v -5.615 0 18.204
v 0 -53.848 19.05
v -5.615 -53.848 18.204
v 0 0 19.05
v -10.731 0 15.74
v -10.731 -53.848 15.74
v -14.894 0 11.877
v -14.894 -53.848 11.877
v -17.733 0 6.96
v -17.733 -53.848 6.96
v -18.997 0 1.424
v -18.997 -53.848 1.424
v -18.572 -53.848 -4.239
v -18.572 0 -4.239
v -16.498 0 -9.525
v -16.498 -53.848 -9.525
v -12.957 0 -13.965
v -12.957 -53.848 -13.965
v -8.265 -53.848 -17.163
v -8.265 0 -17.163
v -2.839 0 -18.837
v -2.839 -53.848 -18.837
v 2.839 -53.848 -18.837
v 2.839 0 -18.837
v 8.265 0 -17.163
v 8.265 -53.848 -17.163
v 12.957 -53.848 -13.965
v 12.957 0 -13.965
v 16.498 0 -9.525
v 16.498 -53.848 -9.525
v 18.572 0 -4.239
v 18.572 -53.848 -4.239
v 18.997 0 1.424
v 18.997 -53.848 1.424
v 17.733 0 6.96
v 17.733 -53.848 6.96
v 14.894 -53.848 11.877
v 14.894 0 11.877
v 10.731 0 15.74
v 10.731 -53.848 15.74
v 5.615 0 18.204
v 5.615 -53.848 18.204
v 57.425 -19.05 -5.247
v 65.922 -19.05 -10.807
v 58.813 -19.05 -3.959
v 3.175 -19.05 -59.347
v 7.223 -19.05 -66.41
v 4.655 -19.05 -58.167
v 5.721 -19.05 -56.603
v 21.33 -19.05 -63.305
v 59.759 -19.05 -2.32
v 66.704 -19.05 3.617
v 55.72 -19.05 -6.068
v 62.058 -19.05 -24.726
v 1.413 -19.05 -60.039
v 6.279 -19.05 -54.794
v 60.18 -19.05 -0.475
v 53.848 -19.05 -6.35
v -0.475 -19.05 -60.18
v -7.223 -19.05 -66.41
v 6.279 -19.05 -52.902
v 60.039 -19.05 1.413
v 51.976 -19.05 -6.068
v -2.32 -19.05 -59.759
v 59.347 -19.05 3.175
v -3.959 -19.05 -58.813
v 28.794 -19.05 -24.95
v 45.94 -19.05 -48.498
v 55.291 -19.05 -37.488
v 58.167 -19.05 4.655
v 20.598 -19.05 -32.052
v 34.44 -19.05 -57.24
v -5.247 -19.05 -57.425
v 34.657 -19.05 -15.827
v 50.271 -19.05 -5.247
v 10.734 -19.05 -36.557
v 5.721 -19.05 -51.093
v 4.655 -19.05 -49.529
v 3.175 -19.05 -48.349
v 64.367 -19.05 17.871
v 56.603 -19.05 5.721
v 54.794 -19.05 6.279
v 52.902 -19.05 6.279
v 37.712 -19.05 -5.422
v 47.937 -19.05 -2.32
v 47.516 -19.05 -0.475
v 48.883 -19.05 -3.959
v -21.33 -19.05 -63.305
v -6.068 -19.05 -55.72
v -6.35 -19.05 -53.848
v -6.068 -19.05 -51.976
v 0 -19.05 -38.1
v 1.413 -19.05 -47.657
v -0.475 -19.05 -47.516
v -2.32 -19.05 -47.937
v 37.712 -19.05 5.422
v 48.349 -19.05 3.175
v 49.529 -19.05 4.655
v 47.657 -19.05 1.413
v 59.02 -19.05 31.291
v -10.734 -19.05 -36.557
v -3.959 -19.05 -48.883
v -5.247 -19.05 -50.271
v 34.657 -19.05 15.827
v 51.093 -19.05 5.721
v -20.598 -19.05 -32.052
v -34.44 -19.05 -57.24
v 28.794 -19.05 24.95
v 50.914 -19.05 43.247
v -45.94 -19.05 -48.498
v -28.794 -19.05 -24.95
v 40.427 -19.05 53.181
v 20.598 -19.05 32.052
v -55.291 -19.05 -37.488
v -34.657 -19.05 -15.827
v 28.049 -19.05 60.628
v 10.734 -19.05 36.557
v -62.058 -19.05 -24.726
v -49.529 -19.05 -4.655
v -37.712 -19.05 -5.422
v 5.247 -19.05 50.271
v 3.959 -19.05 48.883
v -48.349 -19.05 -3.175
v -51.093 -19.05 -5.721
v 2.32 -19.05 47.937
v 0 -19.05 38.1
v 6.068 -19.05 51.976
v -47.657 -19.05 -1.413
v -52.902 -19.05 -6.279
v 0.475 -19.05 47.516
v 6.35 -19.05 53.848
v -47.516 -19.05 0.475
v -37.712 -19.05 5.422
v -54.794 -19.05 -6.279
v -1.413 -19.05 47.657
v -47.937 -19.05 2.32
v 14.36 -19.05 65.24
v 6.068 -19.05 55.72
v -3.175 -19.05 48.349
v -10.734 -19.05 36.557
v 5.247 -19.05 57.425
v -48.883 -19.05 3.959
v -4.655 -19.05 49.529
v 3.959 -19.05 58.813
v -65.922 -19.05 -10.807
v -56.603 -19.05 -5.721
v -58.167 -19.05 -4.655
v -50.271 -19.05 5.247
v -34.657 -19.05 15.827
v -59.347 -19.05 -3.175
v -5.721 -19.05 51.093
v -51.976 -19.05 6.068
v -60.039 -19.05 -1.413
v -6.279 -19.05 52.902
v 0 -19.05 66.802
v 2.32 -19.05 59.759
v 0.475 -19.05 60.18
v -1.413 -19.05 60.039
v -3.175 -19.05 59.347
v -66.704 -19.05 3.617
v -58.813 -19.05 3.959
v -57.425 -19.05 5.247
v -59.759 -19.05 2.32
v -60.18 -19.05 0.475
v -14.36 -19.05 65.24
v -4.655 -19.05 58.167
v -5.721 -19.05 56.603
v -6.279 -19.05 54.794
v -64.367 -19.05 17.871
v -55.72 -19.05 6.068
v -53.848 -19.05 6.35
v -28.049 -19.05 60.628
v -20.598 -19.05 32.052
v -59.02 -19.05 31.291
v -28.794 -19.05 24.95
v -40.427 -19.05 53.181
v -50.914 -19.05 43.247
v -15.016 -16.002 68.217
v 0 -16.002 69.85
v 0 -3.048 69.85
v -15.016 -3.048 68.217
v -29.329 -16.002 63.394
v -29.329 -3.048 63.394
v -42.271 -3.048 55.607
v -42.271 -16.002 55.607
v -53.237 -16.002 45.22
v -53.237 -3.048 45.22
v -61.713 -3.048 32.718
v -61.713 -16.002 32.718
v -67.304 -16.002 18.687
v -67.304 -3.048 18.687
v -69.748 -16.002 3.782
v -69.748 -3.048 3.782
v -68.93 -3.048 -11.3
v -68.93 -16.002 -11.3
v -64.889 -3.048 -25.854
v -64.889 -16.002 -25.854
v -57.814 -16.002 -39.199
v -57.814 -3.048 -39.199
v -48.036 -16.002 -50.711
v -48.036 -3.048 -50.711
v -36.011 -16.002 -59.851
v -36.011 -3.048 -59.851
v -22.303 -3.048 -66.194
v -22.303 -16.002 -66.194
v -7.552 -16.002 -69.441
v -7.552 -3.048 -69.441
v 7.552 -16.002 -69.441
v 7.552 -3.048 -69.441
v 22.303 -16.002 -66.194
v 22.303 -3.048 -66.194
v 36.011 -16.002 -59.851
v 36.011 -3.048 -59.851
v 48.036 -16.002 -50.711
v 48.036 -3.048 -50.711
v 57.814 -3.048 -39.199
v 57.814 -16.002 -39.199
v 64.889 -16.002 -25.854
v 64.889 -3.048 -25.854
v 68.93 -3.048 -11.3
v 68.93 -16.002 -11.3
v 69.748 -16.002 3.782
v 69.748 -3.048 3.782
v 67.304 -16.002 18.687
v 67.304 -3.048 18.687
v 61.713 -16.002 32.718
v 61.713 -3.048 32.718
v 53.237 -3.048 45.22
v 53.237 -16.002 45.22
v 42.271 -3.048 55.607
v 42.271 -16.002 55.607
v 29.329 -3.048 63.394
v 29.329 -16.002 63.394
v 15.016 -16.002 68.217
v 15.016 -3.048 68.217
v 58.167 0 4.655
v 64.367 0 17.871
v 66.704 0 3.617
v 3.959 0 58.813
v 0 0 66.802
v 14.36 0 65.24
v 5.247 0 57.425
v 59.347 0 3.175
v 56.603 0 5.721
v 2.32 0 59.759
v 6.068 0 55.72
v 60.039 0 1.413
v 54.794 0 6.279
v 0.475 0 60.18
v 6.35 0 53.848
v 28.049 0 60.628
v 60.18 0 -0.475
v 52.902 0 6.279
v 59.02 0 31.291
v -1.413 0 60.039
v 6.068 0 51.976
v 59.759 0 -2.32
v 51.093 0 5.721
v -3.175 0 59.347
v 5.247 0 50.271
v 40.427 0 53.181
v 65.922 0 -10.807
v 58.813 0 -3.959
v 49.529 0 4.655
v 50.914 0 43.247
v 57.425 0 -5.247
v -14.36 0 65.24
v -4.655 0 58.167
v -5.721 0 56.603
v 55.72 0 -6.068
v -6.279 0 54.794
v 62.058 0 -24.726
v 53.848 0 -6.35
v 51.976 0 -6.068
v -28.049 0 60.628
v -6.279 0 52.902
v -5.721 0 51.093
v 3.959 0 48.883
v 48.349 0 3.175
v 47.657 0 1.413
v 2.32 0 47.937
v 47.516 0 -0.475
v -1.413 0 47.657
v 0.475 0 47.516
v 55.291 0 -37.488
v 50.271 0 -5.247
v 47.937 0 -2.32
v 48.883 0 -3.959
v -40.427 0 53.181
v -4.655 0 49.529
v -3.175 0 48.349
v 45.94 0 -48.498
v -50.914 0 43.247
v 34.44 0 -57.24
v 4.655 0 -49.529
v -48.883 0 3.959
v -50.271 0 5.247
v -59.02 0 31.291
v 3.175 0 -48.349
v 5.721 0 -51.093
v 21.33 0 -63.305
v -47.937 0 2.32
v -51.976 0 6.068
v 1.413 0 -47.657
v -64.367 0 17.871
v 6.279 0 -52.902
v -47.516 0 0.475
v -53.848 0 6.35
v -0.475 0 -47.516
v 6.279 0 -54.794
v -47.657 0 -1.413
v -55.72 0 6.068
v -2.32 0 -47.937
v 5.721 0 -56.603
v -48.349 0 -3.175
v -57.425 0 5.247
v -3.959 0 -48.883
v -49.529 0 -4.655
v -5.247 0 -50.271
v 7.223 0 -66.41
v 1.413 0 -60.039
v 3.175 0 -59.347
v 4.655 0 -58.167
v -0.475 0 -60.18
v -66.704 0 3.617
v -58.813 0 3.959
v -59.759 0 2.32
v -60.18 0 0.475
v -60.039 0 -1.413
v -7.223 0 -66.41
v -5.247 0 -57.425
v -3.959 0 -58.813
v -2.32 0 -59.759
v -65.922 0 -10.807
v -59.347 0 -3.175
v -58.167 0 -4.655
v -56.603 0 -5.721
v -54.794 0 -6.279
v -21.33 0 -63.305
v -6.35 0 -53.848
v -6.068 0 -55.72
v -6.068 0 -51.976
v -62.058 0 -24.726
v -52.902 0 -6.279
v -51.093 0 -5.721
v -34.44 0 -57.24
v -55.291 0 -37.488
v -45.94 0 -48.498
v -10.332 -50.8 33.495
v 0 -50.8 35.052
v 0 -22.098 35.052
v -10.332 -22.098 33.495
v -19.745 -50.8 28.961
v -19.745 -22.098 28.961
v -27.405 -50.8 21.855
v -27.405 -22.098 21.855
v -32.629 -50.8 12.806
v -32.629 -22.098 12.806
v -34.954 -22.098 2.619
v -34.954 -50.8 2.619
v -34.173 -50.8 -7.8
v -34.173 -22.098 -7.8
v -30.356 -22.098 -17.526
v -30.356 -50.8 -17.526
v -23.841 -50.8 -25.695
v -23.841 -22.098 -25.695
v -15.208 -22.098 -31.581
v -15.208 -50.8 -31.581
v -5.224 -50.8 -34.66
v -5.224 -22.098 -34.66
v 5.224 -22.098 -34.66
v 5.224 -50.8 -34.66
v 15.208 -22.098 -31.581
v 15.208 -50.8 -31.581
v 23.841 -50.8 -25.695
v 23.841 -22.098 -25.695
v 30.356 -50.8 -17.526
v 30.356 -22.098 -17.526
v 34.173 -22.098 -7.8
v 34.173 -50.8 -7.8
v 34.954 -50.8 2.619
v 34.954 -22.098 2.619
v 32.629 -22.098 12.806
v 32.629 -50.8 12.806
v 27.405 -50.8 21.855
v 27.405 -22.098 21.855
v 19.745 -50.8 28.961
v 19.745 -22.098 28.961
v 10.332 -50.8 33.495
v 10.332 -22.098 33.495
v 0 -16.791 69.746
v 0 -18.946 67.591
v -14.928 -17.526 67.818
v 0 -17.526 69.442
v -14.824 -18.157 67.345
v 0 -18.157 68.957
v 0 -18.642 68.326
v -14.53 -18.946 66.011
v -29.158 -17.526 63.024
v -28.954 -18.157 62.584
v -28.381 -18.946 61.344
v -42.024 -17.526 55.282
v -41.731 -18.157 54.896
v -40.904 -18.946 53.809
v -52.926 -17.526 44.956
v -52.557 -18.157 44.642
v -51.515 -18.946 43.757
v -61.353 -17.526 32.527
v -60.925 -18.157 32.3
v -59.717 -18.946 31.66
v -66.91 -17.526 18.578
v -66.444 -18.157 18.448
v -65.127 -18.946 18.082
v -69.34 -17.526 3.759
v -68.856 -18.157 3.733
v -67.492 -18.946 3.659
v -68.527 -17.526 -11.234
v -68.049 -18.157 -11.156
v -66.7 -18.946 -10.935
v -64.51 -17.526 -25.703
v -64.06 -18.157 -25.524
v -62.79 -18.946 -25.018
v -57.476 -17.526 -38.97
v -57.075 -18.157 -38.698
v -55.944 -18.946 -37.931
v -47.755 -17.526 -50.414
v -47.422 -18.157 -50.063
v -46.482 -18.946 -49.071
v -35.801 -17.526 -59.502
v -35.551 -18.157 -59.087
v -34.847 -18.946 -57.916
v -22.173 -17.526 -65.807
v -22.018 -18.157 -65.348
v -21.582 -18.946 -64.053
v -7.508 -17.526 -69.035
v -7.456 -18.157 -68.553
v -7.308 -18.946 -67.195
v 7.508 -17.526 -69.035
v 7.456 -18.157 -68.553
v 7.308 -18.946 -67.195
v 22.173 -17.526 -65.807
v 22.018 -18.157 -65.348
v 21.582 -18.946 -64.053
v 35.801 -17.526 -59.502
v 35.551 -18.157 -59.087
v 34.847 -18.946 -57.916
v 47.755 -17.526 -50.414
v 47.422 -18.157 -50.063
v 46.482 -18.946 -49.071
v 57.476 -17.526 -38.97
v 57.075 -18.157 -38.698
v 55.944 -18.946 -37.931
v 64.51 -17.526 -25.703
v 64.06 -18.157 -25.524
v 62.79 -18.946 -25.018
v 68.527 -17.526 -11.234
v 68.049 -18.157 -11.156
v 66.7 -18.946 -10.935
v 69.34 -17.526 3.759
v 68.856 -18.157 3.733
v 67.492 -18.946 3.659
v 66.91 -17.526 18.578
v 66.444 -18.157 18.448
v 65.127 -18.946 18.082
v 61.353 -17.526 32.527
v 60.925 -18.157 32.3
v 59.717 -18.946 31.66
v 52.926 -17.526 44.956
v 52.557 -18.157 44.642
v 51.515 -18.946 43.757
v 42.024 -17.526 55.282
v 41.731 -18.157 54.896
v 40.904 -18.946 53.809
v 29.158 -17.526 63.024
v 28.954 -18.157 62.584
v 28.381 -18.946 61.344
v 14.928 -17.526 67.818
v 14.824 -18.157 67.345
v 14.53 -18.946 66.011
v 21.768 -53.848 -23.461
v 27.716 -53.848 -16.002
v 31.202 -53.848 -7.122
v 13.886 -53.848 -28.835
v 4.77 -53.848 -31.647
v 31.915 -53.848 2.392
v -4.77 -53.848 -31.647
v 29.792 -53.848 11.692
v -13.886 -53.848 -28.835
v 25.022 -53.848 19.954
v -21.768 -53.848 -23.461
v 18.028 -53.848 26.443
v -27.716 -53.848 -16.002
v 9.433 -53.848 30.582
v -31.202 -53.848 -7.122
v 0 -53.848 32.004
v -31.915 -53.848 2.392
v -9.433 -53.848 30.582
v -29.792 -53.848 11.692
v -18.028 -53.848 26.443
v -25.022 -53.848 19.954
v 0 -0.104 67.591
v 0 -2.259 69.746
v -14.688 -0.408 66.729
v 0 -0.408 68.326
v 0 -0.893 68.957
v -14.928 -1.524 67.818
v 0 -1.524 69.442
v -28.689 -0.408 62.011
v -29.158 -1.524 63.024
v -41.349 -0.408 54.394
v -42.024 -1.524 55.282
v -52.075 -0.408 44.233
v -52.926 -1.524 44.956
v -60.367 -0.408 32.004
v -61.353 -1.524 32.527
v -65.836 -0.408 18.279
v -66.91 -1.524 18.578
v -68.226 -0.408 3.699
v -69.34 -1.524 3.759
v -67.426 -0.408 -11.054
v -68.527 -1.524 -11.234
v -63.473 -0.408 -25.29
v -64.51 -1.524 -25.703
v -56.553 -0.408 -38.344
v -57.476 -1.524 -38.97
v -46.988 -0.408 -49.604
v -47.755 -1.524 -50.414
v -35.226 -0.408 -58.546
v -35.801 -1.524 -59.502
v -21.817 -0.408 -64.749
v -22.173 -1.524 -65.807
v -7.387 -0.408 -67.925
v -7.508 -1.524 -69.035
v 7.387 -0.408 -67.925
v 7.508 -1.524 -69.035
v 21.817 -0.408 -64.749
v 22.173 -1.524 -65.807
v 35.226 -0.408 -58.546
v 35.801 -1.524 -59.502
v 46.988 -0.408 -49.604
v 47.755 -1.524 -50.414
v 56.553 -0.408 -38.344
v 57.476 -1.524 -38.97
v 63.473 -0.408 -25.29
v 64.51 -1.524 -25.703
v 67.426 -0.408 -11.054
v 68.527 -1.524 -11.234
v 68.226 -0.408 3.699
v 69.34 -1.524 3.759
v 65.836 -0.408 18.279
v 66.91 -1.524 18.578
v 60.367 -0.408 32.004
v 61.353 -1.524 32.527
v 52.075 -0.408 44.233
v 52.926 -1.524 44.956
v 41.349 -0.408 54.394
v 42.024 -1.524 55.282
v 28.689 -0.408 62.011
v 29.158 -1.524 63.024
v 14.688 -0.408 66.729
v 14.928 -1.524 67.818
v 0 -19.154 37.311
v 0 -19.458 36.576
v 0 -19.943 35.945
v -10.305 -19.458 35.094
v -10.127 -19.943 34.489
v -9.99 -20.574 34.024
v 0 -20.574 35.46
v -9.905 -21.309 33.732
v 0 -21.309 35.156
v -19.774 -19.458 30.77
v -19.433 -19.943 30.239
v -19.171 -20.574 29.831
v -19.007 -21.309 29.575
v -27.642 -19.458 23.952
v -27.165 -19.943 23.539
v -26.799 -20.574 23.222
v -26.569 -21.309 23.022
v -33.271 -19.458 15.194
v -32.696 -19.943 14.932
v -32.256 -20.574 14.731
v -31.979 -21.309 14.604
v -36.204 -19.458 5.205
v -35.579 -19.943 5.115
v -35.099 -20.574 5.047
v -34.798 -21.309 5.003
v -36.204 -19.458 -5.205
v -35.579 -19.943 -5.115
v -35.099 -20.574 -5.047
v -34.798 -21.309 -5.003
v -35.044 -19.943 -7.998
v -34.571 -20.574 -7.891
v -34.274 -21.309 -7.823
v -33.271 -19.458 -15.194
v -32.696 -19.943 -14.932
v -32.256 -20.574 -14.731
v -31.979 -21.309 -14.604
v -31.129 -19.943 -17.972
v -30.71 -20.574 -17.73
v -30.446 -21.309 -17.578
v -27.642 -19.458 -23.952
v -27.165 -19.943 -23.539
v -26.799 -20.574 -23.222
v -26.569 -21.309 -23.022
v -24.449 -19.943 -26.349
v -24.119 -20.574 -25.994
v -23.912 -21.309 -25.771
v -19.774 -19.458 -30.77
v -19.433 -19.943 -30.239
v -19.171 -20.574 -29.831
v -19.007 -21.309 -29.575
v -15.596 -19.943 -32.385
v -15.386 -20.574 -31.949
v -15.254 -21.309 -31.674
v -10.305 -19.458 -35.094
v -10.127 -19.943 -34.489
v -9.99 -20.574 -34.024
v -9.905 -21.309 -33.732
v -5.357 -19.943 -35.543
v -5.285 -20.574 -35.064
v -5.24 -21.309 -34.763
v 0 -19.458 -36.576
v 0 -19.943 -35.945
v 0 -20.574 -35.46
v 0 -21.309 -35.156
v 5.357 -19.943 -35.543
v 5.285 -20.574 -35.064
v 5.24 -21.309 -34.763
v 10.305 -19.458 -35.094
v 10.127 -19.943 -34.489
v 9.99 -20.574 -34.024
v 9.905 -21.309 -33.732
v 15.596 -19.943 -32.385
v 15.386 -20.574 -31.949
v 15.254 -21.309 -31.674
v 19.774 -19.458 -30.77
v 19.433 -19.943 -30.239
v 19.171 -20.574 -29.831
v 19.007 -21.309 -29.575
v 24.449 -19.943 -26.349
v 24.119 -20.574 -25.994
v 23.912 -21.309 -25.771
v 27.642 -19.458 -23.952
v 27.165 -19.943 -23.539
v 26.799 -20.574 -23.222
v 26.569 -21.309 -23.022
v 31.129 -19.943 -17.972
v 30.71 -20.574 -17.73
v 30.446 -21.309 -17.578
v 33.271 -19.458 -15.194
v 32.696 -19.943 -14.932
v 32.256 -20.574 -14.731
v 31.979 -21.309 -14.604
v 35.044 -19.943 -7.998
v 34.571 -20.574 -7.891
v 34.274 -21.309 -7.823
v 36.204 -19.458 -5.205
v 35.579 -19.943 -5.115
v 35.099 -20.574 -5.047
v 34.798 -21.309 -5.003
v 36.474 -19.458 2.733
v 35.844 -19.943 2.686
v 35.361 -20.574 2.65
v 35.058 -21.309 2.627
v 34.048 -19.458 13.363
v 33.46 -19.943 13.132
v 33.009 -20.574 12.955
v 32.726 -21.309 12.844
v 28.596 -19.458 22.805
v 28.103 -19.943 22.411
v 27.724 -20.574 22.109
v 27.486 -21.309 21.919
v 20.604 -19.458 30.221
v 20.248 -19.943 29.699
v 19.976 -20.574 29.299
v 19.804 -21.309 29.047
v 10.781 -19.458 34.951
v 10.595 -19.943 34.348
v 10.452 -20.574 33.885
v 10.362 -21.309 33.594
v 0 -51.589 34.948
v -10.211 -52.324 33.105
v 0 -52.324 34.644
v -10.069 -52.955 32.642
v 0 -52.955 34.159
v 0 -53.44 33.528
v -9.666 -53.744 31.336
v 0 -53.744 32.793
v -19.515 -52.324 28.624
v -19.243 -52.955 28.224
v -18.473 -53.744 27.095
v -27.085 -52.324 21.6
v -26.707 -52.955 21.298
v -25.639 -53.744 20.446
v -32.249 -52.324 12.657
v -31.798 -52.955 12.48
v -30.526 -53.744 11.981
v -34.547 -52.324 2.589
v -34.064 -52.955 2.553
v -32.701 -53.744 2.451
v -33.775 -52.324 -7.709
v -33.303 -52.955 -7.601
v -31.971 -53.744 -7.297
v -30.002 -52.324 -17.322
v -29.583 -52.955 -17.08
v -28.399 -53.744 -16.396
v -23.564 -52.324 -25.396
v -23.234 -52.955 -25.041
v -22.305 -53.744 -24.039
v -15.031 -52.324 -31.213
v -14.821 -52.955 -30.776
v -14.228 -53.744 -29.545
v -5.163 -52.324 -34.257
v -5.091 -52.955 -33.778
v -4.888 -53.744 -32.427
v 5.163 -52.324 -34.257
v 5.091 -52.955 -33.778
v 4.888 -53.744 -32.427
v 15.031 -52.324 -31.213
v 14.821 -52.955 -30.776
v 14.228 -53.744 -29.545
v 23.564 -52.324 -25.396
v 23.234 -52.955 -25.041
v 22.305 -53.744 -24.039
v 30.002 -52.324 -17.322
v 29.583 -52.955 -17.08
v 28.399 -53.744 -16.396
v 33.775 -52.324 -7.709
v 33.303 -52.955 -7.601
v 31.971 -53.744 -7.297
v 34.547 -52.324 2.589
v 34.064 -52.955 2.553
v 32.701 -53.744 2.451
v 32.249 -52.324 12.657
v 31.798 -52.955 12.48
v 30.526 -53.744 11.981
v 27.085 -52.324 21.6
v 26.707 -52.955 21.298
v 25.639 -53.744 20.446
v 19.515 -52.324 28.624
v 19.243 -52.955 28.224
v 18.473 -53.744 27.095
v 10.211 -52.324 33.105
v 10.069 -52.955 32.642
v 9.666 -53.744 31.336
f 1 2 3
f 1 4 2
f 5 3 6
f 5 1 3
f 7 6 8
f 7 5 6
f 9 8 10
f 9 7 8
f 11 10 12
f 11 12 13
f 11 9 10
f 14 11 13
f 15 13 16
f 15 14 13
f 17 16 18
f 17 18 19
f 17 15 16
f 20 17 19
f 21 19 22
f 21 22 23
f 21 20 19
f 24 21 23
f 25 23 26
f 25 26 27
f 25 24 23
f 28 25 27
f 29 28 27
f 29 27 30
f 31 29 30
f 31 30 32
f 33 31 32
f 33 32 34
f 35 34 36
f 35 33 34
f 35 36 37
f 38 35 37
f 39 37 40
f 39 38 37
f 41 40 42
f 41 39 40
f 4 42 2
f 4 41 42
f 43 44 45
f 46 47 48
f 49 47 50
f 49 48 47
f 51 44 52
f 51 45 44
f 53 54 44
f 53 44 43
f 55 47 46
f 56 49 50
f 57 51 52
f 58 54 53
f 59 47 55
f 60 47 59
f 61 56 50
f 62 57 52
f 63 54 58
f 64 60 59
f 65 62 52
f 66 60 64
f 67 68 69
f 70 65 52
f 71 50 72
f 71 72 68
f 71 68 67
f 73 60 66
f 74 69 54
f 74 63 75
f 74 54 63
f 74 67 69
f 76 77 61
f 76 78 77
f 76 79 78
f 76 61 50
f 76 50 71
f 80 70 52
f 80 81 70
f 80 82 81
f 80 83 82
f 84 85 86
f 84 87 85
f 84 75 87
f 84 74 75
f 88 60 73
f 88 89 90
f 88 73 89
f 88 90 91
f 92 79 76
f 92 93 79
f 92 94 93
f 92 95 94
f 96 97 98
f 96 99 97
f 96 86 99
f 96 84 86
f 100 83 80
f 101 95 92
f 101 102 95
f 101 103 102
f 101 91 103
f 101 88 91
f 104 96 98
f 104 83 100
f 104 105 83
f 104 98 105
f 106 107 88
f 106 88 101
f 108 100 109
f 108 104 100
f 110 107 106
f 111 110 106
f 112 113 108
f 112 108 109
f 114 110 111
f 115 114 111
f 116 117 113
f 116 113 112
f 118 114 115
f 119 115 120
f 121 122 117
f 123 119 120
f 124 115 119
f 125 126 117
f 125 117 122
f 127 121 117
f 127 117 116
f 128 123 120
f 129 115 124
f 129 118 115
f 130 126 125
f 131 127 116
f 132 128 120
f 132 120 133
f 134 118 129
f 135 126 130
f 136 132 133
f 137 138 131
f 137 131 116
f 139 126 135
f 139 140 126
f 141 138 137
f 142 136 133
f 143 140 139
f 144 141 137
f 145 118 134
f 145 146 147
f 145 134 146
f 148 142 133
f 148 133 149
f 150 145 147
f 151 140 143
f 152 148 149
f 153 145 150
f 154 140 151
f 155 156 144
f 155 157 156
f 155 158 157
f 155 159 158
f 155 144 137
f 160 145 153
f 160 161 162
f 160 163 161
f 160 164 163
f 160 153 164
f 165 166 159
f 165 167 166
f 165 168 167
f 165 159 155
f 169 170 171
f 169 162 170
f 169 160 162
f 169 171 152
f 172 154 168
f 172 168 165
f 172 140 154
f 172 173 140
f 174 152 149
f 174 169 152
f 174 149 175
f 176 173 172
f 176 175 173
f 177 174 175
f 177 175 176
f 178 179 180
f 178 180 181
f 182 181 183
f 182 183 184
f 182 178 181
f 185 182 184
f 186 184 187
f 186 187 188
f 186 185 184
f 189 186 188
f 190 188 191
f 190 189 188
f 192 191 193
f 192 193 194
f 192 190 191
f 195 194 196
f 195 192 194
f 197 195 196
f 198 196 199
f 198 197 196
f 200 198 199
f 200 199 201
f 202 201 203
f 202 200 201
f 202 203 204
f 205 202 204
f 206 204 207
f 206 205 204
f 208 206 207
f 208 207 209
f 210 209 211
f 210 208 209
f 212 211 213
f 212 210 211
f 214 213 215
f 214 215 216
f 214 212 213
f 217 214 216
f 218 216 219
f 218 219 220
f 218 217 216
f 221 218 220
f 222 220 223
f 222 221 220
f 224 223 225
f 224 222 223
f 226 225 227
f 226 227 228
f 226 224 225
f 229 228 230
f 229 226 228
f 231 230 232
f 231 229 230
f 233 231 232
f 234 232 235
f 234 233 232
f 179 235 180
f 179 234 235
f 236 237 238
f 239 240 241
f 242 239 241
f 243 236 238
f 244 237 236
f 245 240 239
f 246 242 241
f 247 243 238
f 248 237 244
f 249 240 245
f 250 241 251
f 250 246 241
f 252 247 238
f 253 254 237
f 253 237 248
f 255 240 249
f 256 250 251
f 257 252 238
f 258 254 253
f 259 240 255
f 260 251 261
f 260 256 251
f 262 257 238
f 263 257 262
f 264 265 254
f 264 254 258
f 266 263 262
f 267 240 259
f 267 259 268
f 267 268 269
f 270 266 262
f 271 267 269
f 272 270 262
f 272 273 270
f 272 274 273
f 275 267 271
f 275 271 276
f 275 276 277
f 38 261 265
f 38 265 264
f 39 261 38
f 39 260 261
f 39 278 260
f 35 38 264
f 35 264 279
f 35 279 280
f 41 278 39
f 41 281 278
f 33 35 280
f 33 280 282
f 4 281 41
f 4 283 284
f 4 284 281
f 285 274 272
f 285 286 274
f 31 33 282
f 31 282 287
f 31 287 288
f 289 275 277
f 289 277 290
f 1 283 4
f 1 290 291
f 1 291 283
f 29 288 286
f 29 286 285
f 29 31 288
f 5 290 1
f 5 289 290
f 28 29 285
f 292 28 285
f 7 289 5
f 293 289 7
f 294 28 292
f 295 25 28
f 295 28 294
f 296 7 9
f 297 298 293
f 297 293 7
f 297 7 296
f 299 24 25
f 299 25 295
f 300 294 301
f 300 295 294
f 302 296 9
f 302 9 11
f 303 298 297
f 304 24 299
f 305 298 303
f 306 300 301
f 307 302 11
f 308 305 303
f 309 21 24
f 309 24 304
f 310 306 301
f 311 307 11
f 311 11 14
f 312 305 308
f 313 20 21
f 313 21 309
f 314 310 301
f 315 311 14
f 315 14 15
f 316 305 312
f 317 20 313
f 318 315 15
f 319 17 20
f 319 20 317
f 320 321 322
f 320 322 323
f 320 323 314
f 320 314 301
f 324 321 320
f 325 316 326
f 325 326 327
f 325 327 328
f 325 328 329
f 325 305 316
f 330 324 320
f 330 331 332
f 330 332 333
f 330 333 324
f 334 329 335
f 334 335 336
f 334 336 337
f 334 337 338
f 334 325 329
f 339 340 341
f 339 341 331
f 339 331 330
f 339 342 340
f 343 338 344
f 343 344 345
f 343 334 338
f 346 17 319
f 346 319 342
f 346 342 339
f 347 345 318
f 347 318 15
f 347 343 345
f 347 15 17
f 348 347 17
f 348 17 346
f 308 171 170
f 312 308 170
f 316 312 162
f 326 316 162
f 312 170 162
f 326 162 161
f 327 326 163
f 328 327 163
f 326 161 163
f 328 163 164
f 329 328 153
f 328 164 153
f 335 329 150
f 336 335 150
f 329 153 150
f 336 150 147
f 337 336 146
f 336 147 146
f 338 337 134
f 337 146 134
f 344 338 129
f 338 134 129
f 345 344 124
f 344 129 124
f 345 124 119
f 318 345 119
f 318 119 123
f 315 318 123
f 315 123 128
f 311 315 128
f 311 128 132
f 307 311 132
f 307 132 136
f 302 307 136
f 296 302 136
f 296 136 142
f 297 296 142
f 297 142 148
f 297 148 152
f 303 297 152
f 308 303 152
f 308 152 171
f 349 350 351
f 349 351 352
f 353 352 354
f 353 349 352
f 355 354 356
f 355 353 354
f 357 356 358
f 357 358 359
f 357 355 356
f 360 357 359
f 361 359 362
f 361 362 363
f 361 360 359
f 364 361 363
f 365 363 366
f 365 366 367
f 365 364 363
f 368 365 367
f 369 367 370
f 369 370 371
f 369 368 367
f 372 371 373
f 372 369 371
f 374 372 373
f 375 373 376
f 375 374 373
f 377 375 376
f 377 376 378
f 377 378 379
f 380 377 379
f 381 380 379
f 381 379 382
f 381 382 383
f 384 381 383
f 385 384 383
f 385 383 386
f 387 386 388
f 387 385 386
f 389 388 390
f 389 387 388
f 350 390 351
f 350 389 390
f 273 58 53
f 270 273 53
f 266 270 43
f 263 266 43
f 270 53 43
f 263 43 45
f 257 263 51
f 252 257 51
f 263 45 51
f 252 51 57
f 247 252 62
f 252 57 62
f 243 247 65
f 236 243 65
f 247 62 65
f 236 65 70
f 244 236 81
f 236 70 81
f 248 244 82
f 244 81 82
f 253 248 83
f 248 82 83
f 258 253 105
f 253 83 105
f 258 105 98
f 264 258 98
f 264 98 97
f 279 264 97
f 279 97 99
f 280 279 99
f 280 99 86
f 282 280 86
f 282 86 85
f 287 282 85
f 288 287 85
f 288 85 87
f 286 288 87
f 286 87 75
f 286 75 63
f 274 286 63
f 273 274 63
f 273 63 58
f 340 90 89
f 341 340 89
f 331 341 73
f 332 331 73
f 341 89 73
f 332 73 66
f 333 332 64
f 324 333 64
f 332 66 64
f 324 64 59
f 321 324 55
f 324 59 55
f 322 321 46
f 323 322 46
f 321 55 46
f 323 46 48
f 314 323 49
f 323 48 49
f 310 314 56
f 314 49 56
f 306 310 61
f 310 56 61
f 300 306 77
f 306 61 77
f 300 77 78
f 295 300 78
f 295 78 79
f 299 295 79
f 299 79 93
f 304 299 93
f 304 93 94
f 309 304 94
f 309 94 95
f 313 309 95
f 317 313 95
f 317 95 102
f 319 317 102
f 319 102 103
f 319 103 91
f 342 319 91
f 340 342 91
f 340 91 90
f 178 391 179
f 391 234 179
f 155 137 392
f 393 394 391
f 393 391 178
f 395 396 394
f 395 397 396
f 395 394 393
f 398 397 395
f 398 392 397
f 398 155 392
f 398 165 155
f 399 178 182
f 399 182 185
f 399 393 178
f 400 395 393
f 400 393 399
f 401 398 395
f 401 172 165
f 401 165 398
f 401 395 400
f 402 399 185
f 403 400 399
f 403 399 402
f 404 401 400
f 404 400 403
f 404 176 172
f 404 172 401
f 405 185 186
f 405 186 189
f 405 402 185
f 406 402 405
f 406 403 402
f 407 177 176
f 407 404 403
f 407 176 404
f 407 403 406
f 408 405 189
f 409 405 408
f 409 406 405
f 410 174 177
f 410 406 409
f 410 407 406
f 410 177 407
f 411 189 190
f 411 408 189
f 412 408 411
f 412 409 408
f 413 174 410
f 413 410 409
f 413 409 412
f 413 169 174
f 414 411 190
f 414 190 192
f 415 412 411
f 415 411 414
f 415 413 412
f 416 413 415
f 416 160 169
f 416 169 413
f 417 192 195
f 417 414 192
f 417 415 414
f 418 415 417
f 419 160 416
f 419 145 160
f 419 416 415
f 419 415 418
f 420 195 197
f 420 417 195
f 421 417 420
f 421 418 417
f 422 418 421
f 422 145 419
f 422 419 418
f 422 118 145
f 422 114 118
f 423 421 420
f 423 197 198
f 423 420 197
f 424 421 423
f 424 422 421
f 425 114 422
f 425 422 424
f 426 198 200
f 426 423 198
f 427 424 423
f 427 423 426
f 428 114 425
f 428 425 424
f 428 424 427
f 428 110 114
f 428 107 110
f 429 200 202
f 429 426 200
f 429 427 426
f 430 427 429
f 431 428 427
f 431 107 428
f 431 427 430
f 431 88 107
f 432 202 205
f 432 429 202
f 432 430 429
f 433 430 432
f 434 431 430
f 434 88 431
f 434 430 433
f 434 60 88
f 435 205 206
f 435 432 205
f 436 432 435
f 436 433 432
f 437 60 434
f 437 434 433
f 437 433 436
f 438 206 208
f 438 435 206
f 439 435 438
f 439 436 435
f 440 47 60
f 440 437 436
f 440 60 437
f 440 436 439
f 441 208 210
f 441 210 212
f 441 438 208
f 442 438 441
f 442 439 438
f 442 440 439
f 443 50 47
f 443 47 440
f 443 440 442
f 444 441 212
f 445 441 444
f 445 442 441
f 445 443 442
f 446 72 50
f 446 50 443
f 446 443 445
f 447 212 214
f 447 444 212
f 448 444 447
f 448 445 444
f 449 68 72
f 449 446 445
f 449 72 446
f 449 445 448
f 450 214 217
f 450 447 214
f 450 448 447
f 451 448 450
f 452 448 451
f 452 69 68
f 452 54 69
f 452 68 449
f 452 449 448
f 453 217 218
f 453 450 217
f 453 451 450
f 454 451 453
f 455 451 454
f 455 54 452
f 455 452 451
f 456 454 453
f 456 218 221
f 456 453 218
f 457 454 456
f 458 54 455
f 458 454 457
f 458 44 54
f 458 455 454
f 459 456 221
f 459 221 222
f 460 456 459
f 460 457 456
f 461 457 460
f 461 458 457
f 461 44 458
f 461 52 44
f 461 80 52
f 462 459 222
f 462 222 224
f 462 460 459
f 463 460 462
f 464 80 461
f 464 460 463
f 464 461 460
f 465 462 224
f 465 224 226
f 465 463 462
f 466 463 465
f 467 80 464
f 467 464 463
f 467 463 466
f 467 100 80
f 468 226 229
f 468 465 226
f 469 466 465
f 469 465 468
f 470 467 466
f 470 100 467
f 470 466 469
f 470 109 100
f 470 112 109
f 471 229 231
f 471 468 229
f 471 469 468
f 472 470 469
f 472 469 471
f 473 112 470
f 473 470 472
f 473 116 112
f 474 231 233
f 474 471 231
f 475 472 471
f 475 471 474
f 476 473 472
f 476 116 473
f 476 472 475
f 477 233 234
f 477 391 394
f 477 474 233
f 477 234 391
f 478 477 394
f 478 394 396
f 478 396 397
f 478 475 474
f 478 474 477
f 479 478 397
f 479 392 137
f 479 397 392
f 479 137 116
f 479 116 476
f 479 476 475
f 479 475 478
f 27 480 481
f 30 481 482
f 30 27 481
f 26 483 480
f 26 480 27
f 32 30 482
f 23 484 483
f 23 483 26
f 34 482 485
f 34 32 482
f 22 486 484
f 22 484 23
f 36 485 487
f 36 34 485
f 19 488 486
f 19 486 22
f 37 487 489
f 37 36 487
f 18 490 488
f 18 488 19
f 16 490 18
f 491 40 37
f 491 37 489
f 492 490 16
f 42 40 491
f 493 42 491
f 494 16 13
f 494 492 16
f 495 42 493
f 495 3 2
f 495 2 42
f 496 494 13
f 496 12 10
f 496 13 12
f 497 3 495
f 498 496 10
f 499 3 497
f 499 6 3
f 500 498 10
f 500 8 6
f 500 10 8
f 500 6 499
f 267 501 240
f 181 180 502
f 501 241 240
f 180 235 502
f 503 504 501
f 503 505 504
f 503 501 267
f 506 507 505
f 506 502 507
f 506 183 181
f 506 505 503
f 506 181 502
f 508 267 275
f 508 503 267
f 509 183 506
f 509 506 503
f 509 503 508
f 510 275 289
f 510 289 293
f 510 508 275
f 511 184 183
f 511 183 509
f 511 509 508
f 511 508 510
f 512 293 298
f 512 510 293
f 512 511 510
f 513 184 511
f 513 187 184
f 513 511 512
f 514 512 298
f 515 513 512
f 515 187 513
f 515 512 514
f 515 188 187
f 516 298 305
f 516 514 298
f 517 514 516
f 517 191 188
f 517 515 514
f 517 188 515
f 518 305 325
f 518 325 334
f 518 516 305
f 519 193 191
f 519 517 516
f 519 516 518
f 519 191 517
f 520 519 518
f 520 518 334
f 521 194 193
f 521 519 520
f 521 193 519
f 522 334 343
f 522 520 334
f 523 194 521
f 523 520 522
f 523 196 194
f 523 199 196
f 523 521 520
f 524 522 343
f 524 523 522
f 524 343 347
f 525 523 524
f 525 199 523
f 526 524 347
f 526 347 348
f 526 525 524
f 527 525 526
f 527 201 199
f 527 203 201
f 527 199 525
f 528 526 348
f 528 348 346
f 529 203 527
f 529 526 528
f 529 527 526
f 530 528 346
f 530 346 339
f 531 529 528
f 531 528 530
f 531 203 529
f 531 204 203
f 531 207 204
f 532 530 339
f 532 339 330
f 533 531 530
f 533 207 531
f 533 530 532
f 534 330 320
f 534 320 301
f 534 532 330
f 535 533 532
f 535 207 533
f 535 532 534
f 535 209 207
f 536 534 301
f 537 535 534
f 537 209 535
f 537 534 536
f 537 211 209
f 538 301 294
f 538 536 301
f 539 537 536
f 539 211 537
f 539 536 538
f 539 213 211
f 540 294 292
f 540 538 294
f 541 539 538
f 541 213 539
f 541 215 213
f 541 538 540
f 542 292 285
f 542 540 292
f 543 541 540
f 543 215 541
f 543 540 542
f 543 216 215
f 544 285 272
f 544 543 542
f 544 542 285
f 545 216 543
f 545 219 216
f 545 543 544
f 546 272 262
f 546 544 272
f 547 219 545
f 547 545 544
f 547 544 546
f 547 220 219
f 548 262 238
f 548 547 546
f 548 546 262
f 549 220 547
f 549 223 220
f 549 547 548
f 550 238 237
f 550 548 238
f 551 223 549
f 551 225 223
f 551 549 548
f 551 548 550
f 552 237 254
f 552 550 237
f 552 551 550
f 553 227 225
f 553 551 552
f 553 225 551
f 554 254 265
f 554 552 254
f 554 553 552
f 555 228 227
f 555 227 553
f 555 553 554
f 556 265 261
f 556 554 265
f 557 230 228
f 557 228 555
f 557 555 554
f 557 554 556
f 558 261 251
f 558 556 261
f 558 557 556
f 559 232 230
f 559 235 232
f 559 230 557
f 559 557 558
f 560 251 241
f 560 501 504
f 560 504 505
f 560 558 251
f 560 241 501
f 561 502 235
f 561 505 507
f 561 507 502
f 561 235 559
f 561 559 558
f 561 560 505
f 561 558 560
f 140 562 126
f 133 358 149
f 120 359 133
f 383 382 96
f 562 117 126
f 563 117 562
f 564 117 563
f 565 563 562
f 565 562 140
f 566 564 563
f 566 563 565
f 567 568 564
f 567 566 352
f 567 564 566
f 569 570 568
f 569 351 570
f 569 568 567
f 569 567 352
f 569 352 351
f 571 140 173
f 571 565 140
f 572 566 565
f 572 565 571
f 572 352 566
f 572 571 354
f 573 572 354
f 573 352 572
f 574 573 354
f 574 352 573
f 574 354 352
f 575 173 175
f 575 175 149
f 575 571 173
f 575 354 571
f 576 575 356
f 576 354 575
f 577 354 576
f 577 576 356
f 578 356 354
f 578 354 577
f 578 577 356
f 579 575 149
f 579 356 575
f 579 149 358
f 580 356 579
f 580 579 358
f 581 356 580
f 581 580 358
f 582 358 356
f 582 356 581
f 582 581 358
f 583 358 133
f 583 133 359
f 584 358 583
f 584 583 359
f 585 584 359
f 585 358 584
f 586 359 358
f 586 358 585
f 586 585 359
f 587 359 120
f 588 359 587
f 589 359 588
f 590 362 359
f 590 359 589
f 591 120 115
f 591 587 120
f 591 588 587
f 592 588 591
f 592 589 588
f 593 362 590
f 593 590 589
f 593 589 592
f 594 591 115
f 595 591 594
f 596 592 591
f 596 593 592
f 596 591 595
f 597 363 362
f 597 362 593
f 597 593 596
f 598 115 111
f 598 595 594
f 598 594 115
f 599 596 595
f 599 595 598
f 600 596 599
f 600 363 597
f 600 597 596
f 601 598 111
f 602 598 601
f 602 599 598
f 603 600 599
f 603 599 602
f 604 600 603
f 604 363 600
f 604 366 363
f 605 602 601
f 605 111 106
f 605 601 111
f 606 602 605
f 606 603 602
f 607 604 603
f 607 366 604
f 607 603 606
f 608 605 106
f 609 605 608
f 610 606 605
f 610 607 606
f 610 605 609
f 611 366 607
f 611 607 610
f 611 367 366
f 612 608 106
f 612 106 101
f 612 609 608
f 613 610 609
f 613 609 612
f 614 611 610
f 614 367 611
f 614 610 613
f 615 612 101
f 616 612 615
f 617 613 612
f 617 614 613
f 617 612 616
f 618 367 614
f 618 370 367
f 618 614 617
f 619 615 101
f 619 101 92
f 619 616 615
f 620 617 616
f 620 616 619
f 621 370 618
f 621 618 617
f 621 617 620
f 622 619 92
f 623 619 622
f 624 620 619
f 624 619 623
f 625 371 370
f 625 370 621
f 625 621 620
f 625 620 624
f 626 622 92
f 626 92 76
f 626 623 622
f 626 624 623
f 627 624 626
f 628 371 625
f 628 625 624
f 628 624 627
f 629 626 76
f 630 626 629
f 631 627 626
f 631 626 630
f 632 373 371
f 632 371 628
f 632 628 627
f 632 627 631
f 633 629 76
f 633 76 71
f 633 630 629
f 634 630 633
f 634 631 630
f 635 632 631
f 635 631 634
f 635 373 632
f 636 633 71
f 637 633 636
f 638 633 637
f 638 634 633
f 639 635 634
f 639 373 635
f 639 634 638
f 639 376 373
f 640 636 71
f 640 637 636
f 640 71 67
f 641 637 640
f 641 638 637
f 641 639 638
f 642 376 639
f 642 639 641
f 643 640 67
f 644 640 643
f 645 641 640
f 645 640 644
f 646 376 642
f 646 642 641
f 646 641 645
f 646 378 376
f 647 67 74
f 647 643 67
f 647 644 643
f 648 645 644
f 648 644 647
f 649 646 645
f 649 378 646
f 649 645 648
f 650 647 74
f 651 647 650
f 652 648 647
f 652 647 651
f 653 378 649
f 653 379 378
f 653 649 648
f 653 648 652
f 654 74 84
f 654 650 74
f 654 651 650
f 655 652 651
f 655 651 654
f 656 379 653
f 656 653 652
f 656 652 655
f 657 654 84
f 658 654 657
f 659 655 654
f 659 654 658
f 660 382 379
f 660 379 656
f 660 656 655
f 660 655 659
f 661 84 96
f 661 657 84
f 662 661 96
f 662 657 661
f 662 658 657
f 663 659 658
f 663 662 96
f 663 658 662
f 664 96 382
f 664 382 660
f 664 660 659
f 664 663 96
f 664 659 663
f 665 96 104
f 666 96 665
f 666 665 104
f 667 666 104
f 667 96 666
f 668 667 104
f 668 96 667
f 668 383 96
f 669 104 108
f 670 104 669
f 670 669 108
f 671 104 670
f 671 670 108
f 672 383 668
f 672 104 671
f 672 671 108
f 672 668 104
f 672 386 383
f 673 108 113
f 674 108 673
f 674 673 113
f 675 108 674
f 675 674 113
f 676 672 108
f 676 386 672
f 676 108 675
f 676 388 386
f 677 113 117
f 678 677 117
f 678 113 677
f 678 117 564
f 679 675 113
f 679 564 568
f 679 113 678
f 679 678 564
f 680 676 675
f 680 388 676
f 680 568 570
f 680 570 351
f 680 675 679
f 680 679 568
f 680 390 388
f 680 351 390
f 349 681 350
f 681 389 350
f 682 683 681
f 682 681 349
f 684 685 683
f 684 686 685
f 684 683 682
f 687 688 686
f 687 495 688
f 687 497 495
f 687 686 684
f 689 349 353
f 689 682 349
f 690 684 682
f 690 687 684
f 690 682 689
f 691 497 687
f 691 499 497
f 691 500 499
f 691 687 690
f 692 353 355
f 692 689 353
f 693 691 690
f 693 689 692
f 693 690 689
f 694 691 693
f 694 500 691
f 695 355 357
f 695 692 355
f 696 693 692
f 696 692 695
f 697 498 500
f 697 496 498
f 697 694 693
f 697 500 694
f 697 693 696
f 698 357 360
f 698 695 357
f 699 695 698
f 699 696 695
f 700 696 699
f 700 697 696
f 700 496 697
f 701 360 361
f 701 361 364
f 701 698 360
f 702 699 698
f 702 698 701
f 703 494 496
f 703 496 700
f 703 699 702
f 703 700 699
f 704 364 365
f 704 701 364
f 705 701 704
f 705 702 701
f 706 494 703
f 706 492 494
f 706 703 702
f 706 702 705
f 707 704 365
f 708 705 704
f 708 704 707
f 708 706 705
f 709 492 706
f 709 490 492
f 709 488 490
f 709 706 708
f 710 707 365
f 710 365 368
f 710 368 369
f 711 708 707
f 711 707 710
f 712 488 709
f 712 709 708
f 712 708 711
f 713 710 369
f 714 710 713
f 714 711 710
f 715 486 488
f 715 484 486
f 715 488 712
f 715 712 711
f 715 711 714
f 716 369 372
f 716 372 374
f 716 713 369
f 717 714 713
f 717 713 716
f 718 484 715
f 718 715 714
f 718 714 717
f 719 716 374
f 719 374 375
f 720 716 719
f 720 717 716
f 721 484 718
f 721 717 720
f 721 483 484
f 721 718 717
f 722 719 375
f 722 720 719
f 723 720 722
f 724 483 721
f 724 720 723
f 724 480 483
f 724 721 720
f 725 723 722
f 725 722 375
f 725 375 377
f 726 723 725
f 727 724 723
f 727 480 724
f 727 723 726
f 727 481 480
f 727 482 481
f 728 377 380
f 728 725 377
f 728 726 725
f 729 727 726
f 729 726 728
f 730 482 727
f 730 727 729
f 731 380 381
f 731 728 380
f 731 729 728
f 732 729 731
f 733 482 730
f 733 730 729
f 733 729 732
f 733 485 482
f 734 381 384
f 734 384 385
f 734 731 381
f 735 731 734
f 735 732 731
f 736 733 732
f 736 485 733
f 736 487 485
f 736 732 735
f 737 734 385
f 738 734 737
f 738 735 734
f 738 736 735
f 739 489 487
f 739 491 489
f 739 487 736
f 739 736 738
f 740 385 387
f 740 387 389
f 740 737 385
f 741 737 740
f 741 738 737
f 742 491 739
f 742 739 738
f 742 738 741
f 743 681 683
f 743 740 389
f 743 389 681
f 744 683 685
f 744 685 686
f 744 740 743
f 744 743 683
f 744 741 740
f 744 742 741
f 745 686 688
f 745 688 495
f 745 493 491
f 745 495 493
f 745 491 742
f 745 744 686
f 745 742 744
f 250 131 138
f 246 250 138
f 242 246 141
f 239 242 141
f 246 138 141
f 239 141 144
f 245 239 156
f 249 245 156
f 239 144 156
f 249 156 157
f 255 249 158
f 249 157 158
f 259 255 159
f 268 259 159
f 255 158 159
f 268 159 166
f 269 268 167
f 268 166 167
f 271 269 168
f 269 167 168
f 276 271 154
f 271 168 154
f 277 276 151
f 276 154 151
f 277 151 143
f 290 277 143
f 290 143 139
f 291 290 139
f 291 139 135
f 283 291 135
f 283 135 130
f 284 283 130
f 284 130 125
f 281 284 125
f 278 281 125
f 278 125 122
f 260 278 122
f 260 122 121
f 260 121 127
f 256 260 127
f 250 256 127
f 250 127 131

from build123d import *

# Parameters (mm, degrees)
F2_R            = 3.048
F3_R            = 6.35
F4_DEPTH        = 19.051
F4_COPIES_COUNT = 4


# Not quite as in the source:
# - a pattern or mirror of a feature is missing from the dataset's text; its kind, count and spacing are read off the source's solid


with BuildPart() as f1:
    # F0 (on Right) → F1 (revolve)
    with BuildSketch(Plane.YZ):
        Polygon((-53.848, 19.05), (0, 19.05), (0, 69.85), (-19.05, 69.85), (-19.05, 35.052), (-53.848, 35.052), align=None)
    revolve(axis=Axis((0, -30.1634762436, 0), (0, -1, 0)))

    # F2
    f2_edges = [f1.edges().sort_by_distance(p)[0] for p in [
        (0, -53.848, -35.052),
        (0, -19.05, -35.052),
        (0, -19.05, -69.85),
        (0, 0, -69.85),
    ]]
    fillet(f2_edges, radius=F2_R)

    # F3 (on face) → F4 (cut, through all)
    with BuildSketch(Plane.XZ.offset(19.05)):
        with Locations((0, 53.848)):
            Circle(F3_R)
    f4 = extrude(amount=-F4_DEPTH, mode=Mode.SUBTRACT)

    # F4_copies: F4 ×4 about axis
    f4_copies_axis = Axis((0, 0, 0), (0, 1, 0))
    for i in range(1, F4_COPIES_COUNT):
        add(f4.rotate(f4_copies_axis, i * 360 / F4_COPIES_COUNT), mode=Mode.SUBTRACT)


solid = f1.part
